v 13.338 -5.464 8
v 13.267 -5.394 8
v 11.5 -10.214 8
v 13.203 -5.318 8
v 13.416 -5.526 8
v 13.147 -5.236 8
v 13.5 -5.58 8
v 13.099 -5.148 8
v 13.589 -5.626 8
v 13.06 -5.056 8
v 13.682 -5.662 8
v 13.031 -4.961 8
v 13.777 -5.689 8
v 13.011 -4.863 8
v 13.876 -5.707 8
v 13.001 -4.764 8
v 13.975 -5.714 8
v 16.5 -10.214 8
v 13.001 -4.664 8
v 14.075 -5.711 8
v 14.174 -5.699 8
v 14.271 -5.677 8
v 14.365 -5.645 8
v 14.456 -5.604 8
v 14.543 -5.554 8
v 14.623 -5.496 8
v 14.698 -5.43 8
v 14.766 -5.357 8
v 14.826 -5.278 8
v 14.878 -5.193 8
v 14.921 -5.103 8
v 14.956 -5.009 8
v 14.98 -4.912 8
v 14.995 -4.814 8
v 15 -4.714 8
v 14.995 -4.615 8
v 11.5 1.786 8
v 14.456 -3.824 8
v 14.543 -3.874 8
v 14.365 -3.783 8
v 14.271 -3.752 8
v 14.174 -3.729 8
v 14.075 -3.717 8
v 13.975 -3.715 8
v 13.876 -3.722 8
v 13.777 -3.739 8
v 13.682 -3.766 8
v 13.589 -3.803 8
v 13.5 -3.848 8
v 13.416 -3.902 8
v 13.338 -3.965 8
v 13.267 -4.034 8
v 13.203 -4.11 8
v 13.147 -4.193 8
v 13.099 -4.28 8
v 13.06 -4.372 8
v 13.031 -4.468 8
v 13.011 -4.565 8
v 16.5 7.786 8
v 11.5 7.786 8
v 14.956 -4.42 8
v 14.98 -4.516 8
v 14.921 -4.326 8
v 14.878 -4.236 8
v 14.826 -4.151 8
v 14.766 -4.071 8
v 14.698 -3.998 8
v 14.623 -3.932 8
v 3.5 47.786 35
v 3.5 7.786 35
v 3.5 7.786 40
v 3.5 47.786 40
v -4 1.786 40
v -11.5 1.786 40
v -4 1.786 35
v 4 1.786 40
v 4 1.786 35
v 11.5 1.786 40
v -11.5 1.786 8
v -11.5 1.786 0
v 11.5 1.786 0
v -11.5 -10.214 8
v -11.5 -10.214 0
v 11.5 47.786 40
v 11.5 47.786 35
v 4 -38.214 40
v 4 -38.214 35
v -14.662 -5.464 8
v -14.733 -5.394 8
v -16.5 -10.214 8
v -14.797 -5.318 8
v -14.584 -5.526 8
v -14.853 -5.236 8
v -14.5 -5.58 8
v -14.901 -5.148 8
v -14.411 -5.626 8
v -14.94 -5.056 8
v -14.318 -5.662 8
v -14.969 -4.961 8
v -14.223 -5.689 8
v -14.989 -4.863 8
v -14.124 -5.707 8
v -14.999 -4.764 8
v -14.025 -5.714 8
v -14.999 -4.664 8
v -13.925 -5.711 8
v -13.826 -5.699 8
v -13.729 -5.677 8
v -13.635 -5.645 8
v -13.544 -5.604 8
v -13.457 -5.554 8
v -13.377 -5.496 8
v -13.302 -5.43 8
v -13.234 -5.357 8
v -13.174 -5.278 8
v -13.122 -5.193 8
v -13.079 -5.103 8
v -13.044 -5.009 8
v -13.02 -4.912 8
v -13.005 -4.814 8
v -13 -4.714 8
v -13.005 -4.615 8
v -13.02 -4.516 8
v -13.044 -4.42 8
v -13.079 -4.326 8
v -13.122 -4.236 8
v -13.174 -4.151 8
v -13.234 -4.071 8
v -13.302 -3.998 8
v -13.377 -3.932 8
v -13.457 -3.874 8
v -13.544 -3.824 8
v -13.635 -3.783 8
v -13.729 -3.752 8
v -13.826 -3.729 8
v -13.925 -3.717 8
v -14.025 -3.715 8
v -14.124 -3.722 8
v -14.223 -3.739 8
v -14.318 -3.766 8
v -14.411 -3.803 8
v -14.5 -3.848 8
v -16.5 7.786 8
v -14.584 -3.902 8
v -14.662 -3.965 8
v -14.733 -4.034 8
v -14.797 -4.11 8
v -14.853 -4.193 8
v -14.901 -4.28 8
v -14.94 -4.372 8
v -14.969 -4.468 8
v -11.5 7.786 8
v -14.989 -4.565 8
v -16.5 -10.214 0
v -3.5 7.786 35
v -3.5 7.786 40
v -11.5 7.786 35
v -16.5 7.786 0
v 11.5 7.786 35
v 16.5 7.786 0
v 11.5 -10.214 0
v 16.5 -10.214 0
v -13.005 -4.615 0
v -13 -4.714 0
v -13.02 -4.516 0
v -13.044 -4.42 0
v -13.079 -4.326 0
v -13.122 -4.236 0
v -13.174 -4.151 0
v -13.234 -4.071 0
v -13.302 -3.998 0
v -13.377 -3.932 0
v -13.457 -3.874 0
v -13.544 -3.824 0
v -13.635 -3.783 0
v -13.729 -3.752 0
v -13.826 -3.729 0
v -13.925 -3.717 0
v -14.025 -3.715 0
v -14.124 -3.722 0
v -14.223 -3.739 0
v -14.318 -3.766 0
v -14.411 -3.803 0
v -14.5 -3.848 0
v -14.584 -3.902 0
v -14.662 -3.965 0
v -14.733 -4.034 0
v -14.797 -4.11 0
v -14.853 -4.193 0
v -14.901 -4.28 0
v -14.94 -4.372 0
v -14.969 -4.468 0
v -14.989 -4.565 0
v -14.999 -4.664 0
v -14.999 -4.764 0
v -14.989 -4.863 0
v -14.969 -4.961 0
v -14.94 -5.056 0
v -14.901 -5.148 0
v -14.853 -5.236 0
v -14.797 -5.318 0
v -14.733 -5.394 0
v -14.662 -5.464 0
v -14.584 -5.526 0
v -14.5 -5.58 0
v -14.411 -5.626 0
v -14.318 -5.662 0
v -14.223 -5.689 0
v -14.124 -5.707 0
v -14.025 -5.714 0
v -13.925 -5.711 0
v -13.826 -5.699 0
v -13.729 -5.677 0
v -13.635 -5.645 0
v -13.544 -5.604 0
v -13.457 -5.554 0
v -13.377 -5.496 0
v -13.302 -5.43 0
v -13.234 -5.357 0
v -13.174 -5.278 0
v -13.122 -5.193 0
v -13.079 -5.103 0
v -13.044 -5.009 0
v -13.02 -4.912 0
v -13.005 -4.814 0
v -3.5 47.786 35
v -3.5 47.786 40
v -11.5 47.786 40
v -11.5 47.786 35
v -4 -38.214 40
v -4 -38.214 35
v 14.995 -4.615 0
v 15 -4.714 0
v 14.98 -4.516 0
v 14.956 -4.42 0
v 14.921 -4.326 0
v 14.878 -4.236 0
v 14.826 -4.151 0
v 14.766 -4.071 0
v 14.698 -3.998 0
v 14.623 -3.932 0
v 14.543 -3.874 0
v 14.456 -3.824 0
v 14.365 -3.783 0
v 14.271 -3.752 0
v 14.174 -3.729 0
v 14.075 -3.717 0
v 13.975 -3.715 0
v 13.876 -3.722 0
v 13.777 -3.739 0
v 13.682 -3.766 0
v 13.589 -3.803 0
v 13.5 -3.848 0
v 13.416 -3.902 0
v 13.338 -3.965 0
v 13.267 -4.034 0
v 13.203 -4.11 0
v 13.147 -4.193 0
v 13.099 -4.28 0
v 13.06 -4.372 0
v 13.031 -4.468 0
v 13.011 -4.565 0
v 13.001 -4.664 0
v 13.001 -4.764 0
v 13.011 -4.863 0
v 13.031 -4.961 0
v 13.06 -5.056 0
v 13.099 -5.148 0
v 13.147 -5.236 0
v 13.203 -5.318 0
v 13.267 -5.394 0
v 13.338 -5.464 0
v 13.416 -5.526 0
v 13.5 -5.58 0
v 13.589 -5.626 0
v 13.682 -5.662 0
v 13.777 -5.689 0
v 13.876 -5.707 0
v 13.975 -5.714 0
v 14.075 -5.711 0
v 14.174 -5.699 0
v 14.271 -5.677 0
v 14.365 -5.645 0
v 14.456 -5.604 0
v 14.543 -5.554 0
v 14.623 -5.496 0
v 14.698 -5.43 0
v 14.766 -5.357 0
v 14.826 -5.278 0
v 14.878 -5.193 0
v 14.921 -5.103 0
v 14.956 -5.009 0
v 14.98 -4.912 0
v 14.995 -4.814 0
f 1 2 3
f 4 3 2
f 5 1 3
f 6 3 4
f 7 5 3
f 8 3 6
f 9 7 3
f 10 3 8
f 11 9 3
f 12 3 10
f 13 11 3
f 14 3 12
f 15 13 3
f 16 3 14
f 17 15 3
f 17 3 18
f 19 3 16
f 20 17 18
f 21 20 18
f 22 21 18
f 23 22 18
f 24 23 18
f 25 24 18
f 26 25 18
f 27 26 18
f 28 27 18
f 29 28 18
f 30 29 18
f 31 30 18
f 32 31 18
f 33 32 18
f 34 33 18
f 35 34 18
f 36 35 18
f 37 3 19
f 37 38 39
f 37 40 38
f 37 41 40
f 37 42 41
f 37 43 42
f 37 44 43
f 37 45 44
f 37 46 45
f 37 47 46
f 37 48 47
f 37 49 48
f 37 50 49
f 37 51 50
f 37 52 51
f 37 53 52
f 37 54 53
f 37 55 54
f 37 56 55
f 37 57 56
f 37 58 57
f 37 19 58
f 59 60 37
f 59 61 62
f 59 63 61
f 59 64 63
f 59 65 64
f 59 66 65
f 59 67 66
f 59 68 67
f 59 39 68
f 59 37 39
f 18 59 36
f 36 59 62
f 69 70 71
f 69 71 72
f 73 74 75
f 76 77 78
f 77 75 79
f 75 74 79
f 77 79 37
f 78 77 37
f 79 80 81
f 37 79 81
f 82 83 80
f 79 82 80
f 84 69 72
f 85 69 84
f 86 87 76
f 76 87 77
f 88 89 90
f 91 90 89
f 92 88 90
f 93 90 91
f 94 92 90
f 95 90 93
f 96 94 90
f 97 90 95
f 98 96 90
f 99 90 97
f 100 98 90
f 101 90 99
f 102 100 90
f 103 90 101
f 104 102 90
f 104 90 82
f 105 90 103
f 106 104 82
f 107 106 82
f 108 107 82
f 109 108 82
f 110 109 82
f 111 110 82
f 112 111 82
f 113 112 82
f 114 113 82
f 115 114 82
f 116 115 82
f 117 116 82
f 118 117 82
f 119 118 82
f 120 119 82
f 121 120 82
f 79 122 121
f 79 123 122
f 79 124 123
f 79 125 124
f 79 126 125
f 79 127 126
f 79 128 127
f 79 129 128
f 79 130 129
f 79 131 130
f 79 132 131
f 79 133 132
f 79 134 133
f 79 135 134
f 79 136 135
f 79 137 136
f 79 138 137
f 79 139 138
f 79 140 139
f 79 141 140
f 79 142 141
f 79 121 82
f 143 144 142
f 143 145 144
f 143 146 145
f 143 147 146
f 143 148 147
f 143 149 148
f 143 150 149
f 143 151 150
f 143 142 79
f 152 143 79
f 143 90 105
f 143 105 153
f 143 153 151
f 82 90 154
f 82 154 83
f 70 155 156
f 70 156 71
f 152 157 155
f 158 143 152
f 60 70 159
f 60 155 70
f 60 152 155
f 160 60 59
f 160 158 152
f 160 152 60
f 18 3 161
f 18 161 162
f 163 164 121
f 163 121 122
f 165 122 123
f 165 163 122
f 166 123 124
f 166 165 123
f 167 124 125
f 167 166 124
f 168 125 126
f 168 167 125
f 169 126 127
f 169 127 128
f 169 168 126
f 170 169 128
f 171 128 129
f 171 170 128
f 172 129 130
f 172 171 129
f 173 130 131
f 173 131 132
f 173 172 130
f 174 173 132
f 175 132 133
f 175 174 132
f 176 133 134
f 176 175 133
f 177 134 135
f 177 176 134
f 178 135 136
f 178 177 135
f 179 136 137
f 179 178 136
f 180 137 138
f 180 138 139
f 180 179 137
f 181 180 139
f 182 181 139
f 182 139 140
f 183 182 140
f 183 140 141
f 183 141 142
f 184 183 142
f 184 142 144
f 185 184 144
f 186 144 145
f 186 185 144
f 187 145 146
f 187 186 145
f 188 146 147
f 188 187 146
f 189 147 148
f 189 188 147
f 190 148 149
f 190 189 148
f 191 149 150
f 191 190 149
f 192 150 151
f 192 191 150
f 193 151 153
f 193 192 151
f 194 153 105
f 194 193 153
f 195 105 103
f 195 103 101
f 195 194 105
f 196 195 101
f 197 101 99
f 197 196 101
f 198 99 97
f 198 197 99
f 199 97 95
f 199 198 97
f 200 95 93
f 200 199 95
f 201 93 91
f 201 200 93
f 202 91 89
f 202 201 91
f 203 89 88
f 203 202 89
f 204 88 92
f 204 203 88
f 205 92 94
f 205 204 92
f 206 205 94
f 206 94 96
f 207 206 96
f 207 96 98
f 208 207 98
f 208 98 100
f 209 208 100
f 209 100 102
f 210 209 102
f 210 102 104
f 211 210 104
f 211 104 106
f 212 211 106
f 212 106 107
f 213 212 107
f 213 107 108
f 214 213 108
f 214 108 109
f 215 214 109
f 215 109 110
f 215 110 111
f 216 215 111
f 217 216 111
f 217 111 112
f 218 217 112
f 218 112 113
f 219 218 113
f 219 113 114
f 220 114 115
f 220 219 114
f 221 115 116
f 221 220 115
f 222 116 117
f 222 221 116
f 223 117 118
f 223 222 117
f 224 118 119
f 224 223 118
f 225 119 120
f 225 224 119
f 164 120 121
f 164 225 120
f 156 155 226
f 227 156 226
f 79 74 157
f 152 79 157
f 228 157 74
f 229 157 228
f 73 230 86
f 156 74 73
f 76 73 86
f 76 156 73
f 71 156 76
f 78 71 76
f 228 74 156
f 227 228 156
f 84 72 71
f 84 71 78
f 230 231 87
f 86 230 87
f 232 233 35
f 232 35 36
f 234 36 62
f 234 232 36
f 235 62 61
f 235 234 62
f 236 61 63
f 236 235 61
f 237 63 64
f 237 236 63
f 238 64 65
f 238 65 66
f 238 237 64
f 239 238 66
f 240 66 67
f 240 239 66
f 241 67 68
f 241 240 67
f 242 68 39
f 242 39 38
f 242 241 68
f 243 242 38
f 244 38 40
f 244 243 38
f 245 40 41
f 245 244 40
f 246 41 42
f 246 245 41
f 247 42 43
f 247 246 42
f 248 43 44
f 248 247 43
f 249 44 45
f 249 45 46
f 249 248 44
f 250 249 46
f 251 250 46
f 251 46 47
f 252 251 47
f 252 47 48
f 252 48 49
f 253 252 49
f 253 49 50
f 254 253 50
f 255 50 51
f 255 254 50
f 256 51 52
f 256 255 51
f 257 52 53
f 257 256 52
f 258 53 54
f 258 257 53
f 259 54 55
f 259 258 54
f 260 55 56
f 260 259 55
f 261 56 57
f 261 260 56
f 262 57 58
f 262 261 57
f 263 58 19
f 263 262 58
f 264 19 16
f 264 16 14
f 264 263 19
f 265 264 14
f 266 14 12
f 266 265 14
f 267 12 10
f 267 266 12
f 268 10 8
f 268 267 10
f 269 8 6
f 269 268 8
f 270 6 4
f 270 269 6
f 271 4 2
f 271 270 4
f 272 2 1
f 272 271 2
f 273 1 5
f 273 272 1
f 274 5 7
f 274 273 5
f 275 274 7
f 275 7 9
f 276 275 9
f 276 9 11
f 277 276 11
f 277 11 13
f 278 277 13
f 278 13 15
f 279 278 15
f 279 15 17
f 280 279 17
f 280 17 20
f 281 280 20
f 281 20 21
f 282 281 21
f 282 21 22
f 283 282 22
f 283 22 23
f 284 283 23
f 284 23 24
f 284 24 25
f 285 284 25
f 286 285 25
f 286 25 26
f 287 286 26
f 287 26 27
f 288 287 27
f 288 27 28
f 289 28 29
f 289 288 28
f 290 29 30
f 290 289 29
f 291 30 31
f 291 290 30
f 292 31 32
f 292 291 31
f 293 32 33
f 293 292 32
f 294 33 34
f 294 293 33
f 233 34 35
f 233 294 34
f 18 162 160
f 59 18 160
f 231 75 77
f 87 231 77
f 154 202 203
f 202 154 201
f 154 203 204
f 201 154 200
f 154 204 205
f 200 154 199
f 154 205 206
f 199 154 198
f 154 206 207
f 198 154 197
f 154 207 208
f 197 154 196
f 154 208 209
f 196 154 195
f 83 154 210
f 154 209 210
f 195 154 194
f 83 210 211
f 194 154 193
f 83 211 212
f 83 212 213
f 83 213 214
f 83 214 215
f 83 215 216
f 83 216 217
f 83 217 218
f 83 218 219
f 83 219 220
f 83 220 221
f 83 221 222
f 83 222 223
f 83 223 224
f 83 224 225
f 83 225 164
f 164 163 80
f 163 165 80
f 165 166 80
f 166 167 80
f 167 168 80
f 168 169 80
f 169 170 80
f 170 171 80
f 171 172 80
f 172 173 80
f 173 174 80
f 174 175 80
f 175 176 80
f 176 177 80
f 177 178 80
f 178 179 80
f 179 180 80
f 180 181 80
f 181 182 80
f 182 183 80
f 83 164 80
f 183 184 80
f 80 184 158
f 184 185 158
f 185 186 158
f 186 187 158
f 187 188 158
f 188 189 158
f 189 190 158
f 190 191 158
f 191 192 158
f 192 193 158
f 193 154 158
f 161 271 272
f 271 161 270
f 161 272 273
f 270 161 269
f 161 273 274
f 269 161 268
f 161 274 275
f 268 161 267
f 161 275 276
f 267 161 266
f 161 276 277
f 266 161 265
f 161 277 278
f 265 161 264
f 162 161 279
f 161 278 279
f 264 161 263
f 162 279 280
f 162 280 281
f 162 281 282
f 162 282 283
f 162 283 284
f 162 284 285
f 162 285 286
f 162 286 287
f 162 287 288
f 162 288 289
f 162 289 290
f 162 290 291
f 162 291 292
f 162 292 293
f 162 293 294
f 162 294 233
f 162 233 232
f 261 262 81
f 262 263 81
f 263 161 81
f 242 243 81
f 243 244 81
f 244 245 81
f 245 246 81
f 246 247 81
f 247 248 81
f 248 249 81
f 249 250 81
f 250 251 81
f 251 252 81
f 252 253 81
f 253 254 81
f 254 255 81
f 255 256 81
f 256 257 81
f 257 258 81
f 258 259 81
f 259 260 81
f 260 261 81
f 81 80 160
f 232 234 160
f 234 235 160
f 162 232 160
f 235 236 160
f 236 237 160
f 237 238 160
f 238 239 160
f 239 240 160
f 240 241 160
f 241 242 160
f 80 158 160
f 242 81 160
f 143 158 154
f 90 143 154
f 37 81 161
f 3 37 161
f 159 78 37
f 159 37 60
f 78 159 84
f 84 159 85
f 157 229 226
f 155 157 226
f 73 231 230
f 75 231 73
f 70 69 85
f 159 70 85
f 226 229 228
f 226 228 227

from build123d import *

# Parameters (mm, degrees)
F0_R     = 1
F1_DEPTH = 8
F0_W     = 23
F0_H     = 6
F2_DEPTH = 40
F4_START = 35
F3_W     = 8
F3_H     = 40
F4_DEPTH = 5


with BuildPart() as f1:
    # F0 (on Top) → F1 (new body)
    with BuildSketch(Plane.XY):
        Polygon((-11.5, 1.7857142857), (-11.5, 7.7857142857), (-16.5, 7.7857142857), (-16.5, -10.2142857143), (-11.5, -10.2142857143), align=None)
        with Locations((-14, -4.7142857143)):
            Circle(F0_R, mode=Mode.SUBTRACT)
    extrude(amount=F1_DEPTH)



with BuildPart() as f1b:
    # F0 (on Top) → F1, piece 2 (new body)
    with BuildSketch(Plane.XY):
        Polygon((16.5, 7.7857142857), (11.5, 7.7857142857), (11.5, 1.7857142857), (11.5, -10.2142857143), (16.5, -10.2142857143), align=None)
        with Locations((14, -4.7142857143)):
            Circle(F0_R, mode=Mode.SUBTRACT)
    extrude(amount=F1_DEPTH)


with BuildPart() as f1_1:
    add(f1.part)

    add(f1b.part)  # F2 merges F1b
    # F0 (on Top) → F2 (join)
    with BuildSketch(Plane.XY):
        with Locations((0, 4.7857142857)):
            Rectangle(F0_W, F0_H)
    extrude(amount=F2_DEPTH)

    # F3 (on Top) → F4 (join)
    with BuildSketch(Plane.XY.offset(F4_START)):
        with Locations((-7.5, 27.7857142857)):
            Rectangle(F3_W, F3_H)
        with Locations((7.5, 27.7857142857)):
            Rectangle(F3_W, F3_H)
        with Locations((0, -18.2142857143)):
            Rectangle(F3_W, F3_H)
    extrude(amount=F4_DEPTH)


solid = f1_1.part
